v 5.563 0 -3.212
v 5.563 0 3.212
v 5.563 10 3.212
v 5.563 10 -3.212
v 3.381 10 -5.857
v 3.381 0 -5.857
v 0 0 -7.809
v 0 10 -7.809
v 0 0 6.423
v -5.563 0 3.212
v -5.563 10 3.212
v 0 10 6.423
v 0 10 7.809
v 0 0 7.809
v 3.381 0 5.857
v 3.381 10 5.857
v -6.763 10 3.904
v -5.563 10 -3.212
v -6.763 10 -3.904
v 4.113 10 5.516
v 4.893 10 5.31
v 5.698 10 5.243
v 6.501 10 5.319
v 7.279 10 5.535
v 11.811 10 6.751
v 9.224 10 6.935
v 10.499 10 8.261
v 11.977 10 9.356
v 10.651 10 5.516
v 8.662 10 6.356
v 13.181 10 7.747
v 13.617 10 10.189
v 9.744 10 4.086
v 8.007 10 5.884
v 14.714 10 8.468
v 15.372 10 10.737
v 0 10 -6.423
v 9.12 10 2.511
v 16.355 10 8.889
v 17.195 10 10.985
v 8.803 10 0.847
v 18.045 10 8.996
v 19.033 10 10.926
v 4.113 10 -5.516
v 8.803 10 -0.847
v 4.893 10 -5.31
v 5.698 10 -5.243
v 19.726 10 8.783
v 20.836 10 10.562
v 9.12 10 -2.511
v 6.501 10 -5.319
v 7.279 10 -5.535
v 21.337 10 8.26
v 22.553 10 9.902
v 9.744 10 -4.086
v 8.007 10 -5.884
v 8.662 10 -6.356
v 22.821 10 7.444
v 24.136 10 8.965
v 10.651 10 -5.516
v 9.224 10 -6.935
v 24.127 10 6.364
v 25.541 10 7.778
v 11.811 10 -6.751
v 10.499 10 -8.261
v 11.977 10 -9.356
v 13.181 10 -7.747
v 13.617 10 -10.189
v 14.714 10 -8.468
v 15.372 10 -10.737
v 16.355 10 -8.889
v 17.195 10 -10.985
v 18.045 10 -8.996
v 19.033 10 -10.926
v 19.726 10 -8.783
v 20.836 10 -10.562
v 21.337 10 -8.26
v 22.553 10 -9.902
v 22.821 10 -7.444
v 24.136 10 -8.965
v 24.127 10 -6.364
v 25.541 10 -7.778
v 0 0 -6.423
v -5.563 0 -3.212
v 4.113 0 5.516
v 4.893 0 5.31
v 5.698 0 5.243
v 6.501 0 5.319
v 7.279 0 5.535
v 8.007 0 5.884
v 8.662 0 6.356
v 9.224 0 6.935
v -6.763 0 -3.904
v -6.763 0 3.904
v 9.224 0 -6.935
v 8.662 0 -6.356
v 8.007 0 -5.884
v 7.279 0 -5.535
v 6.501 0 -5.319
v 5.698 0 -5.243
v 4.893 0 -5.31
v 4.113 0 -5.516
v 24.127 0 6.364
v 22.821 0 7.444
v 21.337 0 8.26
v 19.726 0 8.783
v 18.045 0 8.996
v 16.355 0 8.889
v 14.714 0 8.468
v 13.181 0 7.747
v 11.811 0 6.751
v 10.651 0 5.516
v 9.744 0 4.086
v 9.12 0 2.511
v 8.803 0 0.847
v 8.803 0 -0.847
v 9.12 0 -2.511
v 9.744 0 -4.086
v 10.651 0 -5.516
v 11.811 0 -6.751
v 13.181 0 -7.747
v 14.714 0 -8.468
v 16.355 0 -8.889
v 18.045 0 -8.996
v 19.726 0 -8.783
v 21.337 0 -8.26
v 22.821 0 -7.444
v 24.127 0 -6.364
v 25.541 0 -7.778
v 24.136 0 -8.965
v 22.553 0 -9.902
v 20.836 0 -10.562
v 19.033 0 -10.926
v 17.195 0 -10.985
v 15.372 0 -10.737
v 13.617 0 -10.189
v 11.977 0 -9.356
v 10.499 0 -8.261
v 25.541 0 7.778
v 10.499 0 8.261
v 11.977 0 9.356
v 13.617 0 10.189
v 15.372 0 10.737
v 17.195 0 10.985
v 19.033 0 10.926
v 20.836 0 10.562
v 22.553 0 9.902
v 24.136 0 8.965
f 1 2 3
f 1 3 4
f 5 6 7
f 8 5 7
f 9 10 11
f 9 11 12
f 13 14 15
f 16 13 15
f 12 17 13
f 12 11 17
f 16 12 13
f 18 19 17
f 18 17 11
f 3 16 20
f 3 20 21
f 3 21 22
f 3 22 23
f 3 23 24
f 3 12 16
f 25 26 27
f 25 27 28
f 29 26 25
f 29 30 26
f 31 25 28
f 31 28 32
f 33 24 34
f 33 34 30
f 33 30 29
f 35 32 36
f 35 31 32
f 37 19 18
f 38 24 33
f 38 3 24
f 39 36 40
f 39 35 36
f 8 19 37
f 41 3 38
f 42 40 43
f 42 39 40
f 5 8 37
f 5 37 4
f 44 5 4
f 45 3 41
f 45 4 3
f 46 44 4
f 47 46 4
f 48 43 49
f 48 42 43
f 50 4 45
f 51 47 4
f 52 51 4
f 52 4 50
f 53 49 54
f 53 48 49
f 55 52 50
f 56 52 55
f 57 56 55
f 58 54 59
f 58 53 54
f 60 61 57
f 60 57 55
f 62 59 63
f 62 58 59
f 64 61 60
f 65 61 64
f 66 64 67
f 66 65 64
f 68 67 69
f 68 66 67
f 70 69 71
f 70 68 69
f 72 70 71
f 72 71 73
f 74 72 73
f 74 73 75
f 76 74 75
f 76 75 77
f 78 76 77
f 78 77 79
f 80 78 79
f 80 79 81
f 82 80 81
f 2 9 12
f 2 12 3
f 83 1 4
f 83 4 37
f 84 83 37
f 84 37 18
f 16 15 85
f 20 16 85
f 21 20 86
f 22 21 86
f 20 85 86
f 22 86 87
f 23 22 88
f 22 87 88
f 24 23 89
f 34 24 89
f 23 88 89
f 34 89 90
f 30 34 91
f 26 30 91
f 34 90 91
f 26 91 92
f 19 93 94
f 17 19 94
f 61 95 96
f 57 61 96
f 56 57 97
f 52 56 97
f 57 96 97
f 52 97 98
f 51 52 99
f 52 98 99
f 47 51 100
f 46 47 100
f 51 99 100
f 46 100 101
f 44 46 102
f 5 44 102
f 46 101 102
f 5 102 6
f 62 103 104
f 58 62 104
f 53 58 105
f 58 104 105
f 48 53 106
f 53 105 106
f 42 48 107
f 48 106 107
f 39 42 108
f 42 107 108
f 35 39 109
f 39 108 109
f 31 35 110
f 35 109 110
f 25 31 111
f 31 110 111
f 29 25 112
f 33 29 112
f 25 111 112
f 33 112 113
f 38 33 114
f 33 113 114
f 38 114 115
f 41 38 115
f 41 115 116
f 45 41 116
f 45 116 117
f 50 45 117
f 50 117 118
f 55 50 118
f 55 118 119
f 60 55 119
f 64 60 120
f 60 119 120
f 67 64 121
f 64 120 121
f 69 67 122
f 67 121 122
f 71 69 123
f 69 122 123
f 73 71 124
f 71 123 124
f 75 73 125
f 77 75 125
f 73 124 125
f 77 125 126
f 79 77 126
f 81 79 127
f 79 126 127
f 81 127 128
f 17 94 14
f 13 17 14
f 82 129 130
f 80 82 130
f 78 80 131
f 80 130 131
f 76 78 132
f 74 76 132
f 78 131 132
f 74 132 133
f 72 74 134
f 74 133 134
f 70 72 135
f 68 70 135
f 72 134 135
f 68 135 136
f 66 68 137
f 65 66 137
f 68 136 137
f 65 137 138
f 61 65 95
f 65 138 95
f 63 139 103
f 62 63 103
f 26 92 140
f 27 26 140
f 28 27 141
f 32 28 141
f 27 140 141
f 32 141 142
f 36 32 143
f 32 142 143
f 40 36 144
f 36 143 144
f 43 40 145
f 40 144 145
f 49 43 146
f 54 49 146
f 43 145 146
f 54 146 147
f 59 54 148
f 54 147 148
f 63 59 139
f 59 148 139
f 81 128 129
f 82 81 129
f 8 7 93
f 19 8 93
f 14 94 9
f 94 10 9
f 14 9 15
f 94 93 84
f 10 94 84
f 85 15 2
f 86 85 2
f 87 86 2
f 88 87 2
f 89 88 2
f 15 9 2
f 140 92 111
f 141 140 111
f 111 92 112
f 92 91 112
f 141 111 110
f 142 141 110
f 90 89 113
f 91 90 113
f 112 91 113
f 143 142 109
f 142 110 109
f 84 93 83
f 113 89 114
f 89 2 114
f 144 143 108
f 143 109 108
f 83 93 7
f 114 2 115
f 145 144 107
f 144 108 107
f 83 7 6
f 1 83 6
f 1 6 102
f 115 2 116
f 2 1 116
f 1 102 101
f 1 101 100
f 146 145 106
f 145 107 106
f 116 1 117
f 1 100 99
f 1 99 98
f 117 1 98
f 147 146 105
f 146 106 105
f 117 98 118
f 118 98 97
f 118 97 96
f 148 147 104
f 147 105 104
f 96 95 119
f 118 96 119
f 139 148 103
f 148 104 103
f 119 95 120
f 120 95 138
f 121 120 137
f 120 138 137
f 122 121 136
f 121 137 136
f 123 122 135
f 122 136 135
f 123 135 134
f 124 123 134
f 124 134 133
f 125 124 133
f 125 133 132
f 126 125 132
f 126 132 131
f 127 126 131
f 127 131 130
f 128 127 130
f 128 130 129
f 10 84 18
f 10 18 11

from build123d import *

# Parameters (mm, degrees)
BOSS_EXTRUDE1_DEPTH = 10


with BuildPart() as part:
    # Sketch1 → Boss-Extrude1 (new body)
    with BuildSketch(Plane(origin=(0, 0, 0), x_dir=(1, 0, 0), z_dir=(0, 1, 0))):
        Polygon((0, -7.808777861), (6.7626, -3.90438893), (6.7626, 3.90438893), (0, 7.808777861), (-6.7626, 3.90438893), (-6.7626, -3.90438893), align=None)
        Polygon((5.5626, -3.211568607), (5.5626, 3.211568607), (0, 6.423137215), (-5.5626, 3.211568607), (-5.5626, -3.211568607), (0, -6.423137215), align=None, mode=Mode.SUBTRACT)
        with BuildLine():
            ThreePointArc((9.224161182, -6.935060385), (7.396240301, -3.679481838), (6.7626, -2.8e-08))
            Line((6.7626, -2.8e-08), (6.7626, -3.90438893))
            Line((6.7626, -3.90438893), (3.3813, -5.856583396))
            ThreePointArc((3.3813, -5.856583396), (6.501441474, -5.319266604), (9.224161182, -6.935060385))
        make_face()
        with BuildLine():
            ThreePointArc((6.7626, -2.8e-08), (7.396240292, 3.679481812), (9.224161182, 6.935060385))
            ThreePointArc((9.224161182, 6.935060385), (6.501441474, 5.319266604), (3.3813, 5.856583396))
            Line((3.3813, 5.856583396), (6.7626, 3.90438893))
            Line((6.7626, 3.90438893), (6.7626, -2.8e-08))
        make_face()
        with BuildLine():
            Line((24.126561031, 6.363961031), (25.540774593, 7.778174593))
            ThreePointArc((25.540774593, 7.778174593), (6.7626, 0), (25.540774593, -7.778174593))
            Line((25.540774593, -7.778174593), (24.126561031, -6.363961031))
            ThreePointArc((24.126561031, -6.363961031), (8.7626, 0), (24.126561031, 6.363961031))
        make_face()
    extrude(amount=BOSS_EXTRUDE1_DEPTH)


solid = part.part
